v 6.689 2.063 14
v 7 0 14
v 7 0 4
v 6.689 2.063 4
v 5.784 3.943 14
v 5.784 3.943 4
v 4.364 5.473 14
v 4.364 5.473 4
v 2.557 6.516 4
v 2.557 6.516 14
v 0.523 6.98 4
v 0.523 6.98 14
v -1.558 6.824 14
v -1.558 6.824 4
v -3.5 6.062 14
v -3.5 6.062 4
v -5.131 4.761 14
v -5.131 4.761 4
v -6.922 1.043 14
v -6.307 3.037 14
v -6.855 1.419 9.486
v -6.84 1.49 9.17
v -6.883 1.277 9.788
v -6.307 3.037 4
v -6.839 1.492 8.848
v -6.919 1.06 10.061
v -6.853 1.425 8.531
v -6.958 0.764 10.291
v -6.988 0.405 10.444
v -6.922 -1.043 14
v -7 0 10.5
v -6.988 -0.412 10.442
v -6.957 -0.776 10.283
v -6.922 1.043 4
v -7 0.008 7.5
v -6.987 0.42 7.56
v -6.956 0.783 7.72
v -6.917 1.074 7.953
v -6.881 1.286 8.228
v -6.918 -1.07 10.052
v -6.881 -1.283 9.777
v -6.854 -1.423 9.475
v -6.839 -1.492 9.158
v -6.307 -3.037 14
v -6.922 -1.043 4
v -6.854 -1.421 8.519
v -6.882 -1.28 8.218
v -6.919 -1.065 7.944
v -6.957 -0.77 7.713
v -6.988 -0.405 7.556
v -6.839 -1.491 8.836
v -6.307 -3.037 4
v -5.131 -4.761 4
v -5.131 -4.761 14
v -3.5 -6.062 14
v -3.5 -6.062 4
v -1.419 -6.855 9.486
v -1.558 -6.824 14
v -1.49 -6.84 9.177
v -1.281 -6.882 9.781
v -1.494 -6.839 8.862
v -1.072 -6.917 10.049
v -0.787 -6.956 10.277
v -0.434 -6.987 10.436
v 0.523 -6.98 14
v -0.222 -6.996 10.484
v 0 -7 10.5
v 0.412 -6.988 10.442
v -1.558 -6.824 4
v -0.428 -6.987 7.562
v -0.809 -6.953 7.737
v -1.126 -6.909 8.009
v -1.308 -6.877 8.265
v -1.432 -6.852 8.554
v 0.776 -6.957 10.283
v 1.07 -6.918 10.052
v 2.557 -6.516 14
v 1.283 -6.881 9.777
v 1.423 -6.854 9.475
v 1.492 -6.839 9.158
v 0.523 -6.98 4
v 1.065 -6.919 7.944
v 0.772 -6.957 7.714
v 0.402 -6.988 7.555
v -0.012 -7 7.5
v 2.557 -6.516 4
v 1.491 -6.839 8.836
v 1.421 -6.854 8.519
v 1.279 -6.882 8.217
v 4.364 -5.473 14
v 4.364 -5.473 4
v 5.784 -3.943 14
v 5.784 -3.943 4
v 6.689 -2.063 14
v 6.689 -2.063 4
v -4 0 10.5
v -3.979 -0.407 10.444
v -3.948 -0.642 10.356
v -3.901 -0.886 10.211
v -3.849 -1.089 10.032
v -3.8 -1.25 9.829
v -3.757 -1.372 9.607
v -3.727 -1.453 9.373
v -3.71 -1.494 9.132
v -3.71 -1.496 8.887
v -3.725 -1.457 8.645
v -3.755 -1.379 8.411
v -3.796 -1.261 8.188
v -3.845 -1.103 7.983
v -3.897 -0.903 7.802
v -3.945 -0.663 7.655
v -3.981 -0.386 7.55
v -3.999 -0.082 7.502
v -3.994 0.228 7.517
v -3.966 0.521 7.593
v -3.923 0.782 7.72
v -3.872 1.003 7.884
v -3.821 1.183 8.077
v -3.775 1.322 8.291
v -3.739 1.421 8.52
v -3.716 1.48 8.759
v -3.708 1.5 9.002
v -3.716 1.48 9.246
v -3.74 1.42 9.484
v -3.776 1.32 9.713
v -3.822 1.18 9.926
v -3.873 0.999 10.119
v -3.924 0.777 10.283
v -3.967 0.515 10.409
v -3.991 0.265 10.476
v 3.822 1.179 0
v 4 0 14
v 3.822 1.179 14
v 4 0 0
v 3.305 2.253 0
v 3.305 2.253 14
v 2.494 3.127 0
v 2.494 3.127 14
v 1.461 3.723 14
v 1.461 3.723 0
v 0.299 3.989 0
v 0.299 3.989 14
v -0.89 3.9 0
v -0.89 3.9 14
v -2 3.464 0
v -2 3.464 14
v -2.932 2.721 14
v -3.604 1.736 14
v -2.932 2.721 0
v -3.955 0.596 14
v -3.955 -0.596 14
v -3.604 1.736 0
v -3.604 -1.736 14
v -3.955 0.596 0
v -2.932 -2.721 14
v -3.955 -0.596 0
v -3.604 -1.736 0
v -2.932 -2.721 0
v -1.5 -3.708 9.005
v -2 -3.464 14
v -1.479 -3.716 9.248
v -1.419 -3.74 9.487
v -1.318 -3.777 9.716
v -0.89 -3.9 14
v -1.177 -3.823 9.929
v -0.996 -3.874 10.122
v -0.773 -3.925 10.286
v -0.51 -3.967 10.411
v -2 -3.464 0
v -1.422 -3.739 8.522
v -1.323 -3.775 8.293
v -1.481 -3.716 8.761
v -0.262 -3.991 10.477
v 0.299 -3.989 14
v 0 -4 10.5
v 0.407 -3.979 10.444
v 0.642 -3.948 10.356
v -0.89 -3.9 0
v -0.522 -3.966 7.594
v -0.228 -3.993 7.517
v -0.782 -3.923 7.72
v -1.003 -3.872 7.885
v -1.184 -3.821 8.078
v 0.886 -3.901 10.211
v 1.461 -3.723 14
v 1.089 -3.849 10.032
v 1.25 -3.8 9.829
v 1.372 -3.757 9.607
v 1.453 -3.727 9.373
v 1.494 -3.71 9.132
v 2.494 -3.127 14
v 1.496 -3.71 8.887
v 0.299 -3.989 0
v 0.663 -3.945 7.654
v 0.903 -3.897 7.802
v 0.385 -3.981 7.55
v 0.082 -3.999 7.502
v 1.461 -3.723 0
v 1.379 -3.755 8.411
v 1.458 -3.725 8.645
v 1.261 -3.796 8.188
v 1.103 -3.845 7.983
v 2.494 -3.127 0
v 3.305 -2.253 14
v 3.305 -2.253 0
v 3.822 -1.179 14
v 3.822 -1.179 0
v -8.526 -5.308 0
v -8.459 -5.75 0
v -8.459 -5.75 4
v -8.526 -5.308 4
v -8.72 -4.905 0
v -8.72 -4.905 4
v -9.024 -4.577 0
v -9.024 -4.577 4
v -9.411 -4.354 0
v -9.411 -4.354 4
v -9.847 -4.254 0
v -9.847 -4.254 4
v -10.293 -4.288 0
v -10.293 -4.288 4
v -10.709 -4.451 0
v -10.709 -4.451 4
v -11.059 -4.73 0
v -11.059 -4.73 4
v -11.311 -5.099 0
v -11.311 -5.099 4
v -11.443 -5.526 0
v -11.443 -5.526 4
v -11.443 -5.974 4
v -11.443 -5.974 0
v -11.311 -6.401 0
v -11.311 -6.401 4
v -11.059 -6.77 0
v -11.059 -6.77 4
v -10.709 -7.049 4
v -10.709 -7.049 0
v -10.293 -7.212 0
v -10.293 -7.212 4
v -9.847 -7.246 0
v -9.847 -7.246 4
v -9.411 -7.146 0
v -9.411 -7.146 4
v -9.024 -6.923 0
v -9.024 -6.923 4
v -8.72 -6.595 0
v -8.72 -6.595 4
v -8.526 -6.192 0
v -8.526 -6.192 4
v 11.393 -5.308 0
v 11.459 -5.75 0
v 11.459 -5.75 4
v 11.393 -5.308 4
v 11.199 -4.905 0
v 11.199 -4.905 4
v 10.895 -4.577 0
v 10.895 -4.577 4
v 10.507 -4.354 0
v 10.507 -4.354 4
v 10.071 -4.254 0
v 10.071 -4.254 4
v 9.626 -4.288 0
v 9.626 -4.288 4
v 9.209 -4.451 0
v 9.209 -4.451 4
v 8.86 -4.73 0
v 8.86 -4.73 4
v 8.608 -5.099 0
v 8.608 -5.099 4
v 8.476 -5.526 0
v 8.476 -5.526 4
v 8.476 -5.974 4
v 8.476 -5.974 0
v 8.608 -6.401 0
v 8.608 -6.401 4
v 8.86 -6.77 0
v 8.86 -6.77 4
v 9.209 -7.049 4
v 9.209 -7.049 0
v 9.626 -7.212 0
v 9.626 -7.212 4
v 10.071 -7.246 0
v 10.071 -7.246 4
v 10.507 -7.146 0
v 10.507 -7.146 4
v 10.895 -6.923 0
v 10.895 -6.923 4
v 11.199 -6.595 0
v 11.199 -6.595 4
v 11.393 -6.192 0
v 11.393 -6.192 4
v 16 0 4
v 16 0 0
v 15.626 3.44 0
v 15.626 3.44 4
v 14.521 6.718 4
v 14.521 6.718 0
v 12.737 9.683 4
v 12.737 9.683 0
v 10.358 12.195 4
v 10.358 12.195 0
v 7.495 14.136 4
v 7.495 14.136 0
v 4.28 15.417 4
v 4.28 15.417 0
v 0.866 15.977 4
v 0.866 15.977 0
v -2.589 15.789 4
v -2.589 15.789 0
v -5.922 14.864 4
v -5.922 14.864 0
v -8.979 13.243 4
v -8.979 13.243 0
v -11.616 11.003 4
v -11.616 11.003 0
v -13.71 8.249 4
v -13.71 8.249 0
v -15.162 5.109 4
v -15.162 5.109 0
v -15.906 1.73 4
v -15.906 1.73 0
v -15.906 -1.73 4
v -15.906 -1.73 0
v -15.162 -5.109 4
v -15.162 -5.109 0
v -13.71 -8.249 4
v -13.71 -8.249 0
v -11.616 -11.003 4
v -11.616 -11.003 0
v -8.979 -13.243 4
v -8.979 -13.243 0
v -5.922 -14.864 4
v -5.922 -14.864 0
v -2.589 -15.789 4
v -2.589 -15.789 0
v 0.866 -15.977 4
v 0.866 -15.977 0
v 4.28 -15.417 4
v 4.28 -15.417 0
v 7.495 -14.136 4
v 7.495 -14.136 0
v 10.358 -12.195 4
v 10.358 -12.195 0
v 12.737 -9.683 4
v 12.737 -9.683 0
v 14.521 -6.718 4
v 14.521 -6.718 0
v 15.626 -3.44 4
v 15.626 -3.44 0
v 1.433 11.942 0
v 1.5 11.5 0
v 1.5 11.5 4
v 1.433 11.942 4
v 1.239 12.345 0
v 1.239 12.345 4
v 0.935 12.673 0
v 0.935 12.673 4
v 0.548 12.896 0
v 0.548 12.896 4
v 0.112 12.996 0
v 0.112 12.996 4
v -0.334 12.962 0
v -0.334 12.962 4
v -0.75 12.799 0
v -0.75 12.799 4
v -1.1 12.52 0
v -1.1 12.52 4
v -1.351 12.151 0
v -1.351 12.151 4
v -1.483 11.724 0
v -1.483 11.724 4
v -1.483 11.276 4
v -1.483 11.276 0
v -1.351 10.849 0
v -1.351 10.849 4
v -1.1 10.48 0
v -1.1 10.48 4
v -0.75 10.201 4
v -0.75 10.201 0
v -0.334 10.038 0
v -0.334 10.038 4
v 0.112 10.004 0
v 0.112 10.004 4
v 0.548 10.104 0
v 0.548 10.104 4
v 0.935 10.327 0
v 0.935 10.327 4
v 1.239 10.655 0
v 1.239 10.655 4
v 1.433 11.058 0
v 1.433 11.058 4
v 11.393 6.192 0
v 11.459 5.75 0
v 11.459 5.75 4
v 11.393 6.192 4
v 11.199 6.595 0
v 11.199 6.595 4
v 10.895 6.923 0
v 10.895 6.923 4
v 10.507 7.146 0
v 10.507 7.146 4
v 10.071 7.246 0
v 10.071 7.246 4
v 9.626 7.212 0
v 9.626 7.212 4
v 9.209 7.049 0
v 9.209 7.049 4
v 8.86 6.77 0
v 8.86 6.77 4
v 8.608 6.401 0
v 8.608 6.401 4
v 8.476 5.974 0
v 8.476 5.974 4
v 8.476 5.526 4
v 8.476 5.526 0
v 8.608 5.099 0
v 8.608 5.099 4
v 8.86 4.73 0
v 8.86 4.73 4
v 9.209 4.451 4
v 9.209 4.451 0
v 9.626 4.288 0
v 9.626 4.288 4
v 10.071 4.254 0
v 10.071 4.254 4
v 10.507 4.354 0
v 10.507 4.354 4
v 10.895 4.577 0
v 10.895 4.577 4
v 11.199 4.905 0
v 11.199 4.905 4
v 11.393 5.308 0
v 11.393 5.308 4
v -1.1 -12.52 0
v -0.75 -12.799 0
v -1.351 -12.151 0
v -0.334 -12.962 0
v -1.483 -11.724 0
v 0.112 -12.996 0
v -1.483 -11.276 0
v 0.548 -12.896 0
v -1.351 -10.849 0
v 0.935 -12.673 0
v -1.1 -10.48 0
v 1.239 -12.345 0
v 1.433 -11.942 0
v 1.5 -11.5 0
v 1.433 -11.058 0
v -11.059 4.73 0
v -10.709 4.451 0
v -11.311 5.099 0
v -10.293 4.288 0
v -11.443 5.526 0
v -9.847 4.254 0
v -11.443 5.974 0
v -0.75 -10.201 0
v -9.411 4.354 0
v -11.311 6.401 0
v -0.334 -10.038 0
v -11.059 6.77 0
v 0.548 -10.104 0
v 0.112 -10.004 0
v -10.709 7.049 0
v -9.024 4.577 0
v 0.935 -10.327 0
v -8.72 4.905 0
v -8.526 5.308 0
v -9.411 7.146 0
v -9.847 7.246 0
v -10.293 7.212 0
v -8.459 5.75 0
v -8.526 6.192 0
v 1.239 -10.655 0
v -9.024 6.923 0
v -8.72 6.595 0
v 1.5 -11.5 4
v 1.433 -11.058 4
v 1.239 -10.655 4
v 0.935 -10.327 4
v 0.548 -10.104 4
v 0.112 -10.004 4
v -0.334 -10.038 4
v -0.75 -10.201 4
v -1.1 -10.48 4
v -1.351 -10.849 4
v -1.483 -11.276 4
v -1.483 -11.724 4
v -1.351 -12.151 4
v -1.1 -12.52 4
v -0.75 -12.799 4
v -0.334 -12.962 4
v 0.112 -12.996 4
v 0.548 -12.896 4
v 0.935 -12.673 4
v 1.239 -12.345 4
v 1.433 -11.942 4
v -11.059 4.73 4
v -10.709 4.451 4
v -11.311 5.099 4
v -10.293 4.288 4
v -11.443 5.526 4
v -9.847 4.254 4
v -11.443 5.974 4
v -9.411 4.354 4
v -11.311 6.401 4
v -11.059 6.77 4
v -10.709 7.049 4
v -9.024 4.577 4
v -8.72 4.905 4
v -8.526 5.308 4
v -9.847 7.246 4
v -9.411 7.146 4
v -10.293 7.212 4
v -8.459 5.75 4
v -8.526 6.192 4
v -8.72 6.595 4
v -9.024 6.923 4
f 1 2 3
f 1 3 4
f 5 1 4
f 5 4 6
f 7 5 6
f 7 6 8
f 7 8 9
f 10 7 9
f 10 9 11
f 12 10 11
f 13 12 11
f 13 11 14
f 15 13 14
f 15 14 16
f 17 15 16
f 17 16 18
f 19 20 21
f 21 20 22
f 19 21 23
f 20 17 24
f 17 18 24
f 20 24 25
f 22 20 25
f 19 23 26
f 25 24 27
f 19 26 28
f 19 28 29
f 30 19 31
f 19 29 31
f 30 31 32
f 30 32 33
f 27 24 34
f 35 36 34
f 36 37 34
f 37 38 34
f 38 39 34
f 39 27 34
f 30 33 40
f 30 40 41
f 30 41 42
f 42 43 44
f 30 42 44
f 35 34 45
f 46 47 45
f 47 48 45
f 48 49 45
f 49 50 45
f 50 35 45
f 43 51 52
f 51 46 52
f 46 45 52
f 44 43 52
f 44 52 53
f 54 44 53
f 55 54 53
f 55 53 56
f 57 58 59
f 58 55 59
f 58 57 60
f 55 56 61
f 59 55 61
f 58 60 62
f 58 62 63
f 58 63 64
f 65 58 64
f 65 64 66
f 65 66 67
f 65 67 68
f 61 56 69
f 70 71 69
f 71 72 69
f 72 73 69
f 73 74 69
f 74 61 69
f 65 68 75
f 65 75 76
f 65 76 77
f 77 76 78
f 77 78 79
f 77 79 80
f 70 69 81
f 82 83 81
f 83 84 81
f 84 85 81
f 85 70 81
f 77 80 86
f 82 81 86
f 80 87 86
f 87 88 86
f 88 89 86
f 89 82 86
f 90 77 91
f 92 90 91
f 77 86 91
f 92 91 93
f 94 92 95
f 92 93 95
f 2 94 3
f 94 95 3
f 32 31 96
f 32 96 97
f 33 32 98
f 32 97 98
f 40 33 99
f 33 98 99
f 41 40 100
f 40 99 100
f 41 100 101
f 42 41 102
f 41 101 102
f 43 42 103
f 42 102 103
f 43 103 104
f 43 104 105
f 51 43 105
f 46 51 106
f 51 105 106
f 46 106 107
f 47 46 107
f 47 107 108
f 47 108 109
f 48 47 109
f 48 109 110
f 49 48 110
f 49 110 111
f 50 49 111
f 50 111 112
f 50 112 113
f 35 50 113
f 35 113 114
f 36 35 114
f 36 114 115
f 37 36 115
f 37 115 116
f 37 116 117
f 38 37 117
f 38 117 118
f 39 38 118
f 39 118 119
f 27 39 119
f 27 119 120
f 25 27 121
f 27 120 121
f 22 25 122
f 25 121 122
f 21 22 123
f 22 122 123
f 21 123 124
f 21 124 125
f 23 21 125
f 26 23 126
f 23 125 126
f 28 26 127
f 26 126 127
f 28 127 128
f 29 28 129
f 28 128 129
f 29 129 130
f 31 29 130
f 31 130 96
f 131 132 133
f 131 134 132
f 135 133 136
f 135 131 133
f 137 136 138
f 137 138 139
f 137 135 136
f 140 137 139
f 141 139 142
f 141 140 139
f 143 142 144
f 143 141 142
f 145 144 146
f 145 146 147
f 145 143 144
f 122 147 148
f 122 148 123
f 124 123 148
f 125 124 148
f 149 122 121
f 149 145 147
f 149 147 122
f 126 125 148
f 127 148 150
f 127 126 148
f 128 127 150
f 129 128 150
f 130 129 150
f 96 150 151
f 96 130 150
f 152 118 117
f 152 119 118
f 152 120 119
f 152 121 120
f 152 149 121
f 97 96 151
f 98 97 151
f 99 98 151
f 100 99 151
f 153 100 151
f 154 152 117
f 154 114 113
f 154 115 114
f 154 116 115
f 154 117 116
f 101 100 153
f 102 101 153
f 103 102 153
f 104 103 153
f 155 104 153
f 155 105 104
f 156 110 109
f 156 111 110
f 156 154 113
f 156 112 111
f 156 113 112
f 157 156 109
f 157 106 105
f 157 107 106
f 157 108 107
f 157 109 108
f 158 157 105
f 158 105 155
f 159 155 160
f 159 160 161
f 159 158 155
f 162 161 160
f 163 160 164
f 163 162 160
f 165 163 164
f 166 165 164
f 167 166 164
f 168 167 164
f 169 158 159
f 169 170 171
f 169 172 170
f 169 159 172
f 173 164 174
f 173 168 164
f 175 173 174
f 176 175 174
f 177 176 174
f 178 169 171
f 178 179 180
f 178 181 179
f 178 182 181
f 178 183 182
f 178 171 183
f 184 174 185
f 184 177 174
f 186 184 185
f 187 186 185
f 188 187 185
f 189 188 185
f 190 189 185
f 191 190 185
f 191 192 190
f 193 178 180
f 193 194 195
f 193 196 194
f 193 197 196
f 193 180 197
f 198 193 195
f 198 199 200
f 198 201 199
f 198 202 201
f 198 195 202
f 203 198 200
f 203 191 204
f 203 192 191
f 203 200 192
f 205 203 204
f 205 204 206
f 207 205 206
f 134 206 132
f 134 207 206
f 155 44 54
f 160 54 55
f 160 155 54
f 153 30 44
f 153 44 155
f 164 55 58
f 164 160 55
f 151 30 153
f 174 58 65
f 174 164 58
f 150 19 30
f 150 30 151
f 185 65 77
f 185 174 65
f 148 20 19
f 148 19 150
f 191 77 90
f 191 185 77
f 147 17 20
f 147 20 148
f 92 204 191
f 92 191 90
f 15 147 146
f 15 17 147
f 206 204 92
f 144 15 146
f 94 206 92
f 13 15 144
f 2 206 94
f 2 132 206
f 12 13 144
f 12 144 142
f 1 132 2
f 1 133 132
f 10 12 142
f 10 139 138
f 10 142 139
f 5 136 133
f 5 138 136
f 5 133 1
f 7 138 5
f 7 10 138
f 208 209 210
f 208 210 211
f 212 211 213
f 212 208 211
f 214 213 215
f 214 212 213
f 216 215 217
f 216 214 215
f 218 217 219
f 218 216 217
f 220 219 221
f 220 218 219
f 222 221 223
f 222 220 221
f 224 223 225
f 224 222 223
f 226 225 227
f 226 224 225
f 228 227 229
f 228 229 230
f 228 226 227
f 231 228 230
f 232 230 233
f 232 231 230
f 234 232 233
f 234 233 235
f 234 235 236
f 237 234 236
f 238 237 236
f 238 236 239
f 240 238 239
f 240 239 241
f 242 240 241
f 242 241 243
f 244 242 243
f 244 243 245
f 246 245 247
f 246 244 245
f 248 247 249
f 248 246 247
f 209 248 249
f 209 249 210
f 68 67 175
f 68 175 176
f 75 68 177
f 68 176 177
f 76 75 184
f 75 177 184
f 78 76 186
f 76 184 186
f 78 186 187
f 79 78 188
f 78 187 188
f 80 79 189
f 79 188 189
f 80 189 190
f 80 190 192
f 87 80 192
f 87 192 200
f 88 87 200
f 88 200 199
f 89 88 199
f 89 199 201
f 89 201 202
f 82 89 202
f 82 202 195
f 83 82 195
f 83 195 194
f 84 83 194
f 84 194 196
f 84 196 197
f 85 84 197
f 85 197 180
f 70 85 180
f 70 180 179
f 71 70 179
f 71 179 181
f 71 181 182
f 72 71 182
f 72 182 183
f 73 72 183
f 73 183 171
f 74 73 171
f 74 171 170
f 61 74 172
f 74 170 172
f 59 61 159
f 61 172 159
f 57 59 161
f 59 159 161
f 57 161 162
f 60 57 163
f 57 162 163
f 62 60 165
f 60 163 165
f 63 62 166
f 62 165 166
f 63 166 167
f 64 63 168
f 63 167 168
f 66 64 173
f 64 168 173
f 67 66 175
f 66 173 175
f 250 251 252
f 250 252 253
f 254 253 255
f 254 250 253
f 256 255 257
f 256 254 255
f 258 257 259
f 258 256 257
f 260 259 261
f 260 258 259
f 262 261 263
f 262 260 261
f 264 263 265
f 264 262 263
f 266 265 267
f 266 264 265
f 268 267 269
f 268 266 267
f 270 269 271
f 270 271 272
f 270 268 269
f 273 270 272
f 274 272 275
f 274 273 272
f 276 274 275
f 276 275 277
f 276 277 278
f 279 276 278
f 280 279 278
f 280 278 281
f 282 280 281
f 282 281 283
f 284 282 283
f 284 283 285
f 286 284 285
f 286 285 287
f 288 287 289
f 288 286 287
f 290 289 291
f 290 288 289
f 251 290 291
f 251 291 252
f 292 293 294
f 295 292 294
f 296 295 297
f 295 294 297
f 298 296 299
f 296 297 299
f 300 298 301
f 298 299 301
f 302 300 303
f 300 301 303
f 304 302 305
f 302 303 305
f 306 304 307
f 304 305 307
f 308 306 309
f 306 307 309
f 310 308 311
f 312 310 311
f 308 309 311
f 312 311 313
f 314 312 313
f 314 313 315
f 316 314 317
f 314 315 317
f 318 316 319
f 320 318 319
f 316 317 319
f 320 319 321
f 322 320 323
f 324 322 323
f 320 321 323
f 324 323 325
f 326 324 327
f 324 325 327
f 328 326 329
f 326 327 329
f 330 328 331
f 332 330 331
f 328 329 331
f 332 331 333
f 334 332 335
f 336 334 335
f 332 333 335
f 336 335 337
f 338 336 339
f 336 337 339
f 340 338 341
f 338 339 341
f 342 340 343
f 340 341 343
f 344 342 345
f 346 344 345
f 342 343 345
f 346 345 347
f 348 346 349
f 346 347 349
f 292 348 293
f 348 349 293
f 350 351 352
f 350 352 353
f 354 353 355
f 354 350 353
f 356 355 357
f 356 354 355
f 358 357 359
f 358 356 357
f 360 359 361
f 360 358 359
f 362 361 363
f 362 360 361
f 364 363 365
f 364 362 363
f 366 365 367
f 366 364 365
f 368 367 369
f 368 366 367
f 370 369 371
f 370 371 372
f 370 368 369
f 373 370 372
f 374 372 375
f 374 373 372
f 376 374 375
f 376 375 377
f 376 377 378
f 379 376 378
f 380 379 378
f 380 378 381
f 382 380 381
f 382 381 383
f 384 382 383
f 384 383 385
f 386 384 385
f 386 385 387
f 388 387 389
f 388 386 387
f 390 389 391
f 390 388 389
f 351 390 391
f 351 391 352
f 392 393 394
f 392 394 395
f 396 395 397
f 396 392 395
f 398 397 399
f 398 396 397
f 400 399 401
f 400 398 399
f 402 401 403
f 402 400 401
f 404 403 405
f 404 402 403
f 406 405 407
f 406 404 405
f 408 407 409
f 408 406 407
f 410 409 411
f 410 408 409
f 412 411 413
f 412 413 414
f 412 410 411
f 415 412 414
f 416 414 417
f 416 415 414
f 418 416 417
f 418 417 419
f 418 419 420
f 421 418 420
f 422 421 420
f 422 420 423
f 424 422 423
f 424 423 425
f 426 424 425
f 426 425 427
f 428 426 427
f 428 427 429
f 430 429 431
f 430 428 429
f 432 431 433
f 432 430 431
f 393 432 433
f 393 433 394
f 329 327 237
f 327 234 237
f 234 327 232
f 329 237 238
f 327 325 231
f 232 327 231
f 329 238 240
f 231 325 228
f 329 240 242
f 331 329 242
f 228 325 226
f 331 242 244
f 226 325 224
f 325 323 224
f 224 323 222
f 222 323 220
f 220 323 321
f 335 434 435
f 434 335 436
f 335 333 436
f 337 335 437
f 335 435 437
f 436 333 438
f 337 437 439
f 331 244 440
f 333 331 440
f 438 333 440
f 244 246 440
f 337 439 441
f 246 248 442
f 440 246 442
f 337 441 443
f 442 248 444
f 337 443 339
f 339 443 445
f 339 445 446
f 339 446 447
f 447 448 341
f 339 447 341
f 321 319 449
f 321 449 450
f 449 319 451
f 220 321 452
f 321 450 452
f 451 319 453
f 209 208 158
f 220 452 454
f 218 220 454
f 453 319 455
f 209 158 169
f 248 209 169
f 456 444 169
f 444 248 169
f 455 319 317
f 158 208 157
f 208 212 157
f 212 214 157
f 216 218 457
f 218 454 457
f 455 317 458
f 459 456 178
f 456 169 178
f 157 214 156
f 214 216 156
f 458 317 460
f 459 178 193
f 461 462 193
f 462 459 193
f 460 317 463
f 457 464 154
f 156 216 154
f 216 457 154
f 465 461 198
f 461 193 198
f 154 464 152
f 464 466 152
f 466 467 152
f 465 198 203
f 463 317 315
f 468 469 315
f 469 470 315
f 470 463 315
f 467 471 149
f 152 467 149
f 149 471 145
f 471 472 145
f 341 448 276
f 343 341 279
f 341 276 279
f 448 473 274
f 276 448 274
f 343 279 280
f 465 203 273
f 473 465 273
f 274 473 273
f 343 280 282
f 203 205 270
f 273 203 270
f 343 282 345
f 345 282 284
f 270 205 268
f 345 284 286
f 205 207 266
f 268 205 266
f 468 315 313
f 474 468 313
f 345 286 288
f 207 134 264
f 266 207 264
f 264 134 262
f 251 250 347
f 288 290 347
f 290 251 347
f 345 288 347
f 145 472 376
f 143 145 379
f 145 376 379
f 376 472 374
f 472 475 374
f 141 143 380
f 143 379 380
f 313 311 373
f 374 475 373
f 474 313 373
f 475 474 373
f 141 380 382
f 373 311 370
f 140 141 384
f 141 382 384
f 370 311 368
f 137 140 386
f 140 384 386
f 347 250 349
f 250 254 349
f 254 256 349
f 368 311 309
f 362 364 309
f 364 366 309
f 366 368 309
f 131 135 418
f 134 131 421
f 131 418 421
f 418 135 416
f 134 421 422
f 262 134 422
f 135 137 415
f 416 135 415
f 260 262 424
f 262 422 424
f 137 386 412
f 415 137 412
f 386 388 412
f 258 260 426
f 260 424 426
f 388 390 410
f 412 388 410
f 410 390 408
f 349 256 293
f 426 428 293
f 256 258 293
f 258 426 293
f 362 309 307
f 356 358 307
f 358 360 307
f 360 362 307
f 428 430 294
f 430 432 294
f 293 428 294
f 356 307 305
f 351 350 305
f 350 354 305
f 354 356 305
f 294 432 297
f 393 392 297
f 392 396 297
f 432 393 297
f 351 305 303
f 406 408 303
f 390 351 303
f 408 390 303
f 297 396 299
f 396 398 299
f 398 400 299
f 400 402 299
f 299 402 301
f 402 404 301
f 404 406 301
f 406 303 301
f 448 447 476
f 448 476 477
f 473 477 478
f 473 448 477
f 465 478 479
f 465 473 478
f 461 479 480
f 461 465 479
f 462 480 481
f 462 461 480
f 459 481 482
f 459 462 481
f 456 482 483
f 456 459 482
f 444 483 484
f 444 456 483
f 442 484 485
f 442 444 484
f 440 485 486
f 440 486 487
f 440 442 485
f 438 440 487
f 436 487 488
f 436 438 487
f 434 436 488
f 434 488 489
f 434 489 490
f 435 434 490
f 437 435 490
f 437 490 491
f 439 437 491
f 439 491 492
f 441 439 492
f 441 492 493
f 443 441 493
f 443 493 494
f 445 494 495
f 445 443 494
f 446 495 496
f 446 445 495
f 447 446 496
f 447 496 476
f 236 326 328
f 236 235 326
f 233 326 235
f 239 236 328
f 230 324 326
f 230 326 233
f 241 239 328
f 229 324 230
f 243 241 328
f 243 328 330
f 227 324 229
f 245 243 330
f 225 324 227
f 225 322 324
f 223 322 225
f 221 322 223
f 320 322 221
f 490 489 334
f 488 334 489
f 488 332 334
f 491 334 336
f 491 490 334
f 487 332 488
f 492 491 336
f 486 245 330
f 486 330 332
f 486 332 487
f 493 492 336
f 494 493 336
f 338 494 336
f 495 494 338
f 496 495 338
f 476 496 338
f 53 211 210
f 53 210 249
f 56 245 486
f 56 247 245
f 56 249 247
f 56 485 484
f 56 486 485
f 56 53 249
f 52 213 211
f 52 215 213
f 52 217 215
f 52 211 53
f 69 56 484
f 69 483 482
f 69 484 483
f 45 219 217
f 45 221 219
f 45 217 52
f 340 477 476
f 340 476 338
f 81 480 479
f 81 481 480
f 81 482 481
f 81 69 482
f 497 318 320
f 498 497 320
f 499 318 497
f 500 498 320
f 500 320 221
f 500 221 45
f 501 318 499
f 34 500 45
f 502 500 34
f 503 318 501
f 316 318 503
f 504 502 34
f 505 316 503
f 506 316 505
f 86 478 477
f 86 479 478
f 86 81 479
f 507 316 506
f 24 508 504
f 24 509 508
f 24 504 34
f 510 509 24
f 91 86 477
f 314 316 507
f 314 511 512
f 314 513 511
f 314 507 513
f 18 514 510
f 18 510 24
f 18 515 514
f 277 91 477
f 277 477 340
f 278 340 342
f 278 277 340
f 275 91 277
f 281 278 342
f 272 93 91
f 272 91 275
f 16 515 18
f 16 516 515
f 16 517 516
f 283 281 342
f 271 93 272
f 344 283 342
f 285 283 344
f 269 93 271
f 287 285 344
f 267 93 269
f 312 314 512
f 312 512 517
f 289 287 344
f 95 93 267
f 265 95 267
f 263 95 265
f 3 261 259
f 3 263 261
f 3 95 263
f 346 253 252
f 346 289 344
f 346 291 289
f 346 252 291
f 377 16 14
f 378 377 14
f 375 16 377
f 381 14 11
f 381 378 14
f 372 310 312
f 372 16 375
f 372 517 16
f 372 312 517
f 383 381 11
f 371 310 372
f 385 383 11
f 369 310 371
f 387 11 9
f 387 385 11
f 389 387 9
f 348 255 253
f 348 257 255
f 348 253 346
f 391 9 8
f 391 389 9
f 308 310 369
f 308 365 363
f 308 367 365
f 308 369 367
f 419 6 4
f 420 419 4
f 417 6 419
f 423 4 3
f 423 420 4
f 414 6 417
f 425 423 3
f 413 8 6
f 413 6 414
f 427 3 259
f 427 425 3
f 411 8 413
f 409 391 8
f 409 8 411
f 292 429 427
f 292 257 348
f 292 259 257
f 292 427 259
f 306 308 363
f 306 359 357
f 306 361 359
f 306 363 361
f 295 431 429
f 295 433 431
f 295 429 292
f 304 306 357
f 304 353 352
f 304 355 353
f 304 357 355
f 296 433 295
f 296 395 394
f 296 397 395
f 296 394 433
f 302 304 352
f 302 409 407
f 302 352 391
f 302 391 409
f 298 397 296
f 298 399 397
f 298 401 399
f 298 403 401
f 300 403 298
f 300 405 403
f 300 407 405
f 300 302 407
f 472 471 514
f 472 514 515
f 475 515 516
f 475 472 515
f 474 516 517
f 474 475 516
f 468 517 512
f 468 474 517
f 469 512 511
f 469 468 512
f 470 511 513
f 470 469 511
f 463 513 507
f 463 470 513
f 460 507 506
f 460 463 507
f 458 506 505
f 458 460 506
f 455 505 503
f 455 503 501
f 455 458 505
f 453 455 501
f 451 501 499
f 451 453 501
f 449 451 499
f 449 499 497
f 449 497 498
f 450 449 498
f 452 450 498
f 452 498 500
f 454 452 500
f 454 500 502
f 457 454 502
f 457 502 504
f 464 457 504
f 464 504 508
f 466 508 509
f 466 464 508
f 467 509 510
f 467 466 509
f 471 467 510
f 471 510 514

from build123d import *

# Parameters (mm, degrees)
SKETCH_1_R          = 16
SKETCH_1_R_2        = 4
SKETCH_1_R_3        = 1.5
EXTRUDE_1_DEPTH     = 4
SKETCH_2_R          = 7
SKETCH_2_R_2        = 4
EXTRUDE_2_DEPTH     = 10
SKETCH_3_R          = 1.5
CUT_EXTRUDE_1_DEPTH = 10
SKETCH_4_R          = 1.5
CUT_EXTRUDE_2_DEPTH = 10


with BuildPart() as part:
    # 草图1 → 凸台-拉伸1 (new body)
    with BuildSketch(Plane.XY):
        Circle(SKETCH_1_R)
        Circle(SKETCH_1_R_2, mode=Mode.SUBTRACT)
        with Locations((0, -11.5)):
            Circle(SKETCH_1_R_3, mode=Mode.SUBTRACT)
        with Locations((-9.959292144, -5.75)):
            Circle(SKETCH_1_R_3, mode=Mode.SUBTRACT)
        with Locations((-9.959292144, 5.75)):
            Circle(SKETCH_1_R_3, mode=Mode.SUBTRACT)
        with Locations((0, 11.5)):
            Circle(SKETCH_1_R_3, mode=Mode.SUBTRACT)
        with Locations((9.959292144, 5.75)):
            Circle(SKETCH_1_R_3, mode=Mode.SUBTRACT)
        with Locations((9.959292144, -5.75)):
            Circle(SKETCH_1_R_3, mode=Mode.SUBTRACT)
    extrude(amount=EXTRUDE_1_DEPTH)

    # 草图2 → 凸台-拉伸2 (add)
    with BuildSketch(Plane.XY.offset(4)):
        Circle(SKETCH_2_R)
        Circle(SKETCH_2_R_2, mode=Mode.SUBTRACT)
    extrude(amount=EXTRUDE_2_DEPTH)

    # 草图3 → 切除-拉伸1 (cut)
    with BuildSketch(Plane(origin=(0, 0, 0), x_dir=(1, 0, 0), z_dir=(0, 1, 0))):
        with Locations(Location((0, -9, 0), (0, 0, 270))):
            Circle(SKETCH_3_R)
    extrude(amount=-CUT_EXTRUDE_1_DEPTH, mode=Mode.SUBTRACT)

    # 草图4 → 切除-拉伸2 (cut)
    with BuildSketch(Plane(origin=(0, 0, 0), x_dir=(0, 0, -1), z_dir=(1, 0, 0))):
        with Locations(Location((-9, 0, 0), (0, 0, 180))):
            Circle(SKETCH_4_R)
    extrude(amount=-CUT_EXTRUDE_2_DEPTH, mode=Mode.SUBTRACT)


solid = part.part
